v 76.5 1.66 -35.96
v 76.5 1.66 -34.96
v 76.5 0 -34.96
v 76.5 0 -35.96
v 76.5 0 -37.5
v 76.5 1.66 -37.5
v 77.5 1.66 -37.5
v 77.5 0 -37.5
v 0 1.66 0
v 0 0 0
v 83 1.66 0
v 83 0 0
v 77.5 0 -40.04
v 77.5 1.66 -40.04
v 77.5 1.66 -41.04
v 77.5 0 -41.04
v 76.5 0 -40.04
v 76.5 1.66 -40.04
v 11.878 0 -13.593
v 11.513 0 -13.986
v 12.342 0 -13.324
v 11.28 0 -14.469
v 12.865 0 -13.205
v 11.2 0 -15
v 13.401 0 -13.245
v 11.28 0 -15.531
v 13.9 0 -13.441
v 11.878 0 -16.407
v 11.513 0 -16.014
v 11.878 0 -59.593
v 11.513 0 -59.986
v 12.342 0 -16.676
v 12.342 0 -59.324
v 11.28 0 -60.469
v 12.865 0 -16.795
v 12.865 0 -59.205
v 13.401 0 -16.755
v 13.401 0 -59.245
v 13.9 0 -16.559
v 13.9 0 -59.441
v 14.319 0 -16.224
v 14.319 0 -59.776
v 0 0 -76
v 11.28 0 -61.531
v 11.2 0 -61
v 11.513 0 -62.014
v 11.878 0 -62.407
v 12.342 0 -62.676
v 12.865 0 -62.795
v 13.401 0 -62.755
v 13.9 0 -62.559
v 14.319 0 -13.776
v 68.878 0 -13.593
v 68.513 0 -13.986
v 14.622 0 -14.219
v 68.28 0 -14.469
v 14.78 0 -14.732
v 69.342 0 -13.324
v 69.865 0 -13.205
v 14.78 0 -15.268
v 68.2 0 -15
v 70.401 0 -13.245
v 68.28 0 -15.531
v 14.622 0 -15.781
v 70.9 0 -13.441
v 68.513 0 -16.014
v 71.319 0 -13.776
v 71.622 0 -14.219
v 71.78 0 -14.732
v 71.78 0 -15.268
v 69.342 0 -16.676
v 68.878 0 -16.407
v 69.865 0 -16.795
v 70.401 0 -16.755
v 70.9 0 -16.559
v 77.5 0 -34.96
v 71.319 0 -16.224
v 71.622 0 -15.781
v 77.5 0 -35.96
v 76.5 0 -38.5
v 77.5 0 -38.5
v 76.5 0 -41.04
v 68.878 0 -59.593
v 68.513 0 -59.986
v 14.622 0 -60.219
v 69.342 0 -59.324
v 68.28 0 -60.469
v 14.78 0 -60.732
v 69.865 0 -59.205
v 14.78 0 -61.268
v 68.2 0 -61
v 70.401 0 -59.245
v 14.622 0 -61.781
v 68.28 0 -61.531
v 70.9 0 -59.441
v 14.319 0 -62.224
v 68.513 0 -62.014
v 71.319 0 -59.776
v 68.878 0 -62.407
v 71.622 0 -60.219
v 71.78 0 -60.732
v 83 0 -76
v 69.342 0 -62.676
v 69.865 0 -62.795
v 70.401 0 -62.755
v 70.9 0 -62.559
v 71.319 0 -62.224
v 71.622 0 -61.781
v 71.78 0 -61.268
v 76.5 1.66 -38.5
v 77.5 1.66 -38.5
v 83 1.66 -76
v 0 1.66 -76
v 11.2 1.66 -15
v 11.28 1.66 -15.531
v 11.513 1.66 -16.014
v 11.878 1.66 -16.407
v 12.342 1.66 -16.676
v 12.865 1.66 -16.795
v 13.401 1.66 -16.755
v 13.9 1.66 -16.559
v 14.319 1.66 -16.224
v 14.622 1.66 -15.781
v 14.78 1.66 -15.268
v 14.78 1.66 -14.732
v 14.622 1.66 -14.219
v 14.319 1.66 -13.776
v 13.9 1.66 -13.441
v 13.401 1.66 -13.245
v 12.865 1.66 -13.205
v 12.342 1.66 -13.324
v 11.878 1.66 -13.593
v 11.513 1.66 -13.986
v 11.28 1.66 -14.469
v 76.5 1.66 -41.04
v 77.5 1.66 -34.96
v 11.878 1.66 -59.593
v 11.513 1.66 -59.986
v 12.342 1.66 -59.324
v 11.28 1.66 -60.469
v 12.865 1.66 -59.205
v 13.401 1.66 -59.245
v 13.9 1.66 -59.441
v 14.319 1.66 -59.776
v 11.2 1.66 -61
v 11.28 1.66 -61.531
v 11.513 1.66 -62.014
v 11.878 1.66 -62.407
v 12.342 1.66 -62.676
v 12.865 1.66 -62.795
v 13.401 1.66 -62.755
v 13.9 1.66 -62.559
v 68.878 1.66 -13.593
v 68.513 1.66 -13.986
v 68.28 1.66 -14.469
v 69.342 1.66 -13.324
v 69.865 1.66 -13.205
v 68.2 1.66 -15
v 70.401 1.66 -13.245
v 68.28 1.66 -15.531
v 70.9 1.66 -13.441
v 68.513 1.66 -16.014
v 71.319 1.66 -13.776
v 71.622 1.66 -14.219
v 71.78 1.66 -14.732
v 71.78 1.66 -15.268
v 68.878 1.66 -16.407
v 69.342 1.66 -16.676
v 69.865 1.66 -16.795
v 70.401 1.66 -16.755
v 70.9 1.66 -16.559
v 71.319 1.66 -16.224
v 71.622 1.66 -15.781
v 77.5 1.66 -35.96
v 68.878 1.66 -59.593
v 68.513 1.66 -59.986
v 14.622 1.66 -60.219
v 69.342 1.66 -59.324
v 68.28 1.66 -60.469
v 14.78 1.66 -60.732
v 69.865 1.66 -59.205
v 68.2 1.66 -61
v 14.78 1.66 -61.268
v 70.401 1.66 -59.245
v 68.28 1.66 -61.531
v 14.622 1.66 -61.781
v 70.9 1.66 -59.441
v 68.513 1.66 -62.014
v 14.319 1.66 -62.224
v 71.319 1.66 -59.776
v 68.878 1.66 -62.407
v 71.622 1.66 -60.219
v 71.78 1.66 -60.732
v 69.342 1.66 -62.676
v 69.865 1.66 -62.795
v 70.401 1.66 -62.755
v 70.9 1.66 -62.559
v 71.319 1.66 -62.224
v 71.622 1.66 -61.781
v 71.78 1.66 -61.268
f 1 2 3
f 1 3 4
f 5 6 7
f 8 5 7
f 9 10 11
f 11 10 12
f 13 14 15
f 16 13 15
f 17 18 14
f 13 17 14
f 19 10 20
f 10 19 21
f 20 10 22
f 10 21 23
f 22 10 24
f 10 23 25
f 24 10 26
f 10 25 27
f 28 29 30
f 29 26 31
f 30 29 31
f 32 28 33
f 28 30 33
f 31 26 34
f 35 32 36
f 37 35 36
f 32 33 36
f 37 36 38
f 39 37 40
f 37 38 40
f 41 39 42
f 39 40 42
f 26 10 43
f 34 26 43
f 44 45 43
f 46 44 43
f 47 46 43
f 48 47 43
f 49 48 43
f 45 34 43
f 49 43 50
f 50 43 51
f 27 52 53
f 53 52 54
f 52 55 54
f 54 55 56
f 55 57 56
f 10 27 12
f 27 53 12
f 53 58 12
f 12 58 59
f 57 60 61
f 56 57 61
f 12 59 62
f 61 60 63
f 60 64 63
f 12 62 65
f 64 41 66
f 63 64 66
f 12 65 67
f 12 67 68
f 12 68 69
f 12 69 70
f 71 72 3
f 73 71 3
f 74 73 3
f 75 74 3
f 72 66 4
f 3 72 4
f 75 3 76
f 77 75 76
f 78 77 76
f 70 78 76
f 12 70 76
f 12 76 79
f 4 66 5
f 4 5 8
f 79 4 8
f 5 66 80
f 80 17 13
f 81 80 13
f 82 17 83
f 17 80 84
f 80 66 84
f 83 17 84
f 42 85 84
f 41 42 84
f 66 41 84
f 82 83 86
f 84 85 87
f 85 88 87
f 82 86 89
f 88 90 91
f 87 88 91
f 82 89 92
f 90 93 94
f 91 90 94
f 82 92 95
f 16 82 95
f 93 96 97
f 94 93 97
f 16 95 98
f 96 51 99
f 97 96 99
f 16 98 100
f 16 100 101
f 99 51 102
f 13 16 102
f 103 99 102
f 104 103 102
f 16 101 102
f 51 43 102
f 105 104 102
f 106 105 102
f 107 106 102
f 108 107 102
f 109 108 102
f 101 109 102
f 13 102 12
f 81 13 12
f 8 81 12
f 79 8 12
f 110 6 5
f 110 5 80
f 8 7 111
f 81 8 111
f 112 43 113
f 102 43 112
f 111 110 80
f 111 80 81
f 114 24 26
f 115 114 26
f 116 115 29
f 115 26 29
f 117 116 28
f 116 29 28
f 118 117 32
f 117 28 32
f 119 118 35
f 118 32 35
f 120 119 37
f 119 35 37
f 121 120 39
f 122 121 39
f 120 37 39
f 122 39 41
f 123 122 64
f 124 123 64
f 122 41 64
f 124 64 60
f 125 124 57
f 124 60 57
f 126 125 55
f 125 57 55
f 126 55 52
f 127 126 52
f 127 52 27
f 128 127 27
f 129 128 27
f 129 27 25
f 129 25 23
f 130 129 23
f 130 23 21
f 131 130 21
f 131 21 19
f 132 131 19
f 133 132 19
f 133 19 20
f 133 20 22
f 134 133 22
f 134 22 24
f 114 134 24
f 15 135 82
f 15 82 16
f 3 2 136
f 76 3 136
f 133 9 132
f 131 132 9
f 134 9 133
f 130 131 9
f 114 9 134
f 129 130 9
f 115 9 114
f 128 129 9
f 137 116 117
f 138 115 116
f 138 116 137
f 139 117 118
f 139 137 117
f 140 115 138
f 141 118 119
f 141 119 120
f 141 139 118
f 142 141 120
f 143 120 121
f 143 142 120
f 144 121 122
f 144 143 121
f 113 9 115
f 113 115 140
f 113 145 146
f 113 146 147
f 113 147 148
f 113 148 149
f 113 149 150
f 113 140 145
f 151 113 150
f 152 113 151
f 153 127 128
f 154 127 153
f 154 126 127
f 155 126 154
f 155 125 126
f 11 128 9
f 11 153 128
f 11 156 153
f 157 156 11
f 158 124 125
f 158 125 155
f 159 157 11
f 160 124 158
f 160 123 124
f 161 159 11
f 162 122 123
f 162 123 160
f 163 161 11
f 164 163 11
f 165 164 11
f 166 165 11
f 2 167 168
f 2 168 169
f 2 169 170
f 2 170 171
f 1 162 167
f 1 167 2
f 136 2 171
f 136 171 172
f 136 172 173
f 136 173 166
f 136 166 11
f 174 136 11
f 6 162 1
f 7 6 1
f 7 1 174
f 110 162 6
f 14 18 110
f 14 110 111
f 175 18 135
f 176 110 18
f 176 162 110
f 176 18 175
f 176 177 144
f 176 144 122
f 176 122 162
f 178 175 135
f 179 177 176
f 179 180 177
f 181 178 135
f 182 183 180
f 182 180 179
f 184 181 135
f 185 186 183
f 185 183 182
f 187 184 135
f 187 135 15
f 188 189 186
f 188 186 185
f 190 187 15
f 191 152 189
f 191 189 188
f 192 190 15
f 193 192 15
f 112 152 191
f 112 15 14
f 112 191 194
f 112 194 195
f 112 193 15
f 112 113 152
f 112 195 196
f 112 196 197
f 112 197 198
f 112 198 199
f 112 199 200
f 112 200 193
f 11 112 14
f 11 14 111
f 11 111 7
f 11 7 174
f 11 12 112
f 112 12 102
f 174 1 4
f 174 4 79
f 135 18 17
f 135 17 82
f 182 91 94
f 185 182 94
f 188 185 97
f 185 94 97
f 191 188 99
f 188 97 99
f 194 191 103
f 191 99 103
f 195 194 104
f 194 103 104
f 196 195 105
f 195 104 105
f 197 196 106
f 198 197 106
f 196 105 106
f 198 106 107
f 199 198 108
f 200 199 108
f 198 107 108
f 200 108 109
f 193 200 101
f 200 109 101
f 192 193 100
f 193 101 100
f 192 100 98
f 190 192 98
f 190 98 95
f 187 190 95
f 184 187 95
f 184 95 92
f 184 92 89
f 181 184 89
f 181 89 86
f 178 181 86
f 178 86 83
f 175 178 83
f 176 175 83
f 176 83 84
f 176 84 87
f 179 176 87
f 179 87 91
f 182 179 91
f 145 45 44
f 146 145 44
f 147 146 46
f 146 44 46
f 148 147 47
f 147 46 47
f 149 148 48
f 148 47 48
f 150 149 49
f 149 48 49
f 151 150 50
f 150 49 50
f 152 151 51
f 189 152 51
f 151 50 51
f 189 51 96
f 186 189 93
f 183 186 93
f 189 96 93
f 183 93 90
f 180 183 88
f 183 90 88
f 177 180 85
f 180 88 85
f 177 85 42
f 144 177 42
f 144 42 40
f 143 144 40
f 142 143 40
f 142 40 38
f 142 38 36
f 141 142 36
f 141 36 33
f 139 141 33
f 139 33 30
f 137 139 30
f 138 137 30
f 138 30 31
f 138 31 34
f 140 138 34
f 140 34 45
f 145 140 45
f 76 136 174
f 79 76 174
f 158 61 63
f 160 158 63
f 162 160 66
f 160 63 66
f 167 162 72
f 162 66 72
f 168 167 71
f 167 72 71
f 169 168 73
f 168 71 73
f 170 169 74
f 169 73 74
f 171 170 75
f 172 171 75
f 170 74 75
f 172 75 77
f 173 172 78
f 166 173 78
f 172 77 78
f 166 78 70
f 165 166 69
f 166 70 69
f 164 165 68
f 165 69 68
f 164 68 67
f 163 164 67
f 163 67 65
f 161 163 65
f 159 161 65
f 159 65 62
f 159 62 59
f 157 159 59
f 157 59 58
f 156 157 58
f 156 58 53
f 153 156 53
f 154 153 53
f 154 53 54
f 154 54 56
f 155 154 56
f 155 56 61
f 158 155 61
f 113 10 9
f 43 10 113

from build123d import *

# Parameters (mm, degrees)
SKETCH2_W            = 83
SKETCH2_H            = 76
BOSS_EXTRUDE1_DEPTH  = 1.66
SKETCH3_W            = 1
SKETCH3_H            = 1
CUT_EXTRUDE1_DEPTH   = 113.551124384
M3_CLEARANCE_HOLE2_D = 3.6


with BuildPart() as part:
    # Sketch2 → Boss-Extrude1 (new body)
    with BuildSketch(Plane(origin=(0, 0, 0), x_dir=(1, 0, 0), z_dir=(0, 1, 0))):
        with Locations((41.5, 38)):
            Rectangle(SKETCH2_W, SKETCH2_H)
    extrude(amount=BOSS_EXTRUDE1_DEPTH)

    # Sketch3 → Cut-Extrude1 (cut, through all)
    with BuildSketch(Plane(origin=(0, 1.66, 0), x_dir=(1, 0, 0), z_dir=(0, 1, 0))):
        with Locations((77, 38)):
            Rectangle(SKETCH3_W, SKETCH3_H)
        with Locations((77, 40.54)):
            Rectangle(SKETCH3_W, SKETCH3_H)
        with Locations((77, 35.46)):
            Rectangle(SKETCH3_W, SKETCH3_H)
    extrude(amount=-CUT_EXTRUDE1_DEPTH, mode=Mode.SUBTRACT)

    # M3 Clearance Hole2 (through all)
    with Locations(Plane(origin=(0, 1.66, 0), x_dir=(1, 0, 0), z_dir=(0, 1, 0))):
        with Locations((13, 61), (70, 61), (70, 15), (13, 15)):
            Hole(M3_CLEARANCE_HOLE2_D / 2)


solid = part.part
